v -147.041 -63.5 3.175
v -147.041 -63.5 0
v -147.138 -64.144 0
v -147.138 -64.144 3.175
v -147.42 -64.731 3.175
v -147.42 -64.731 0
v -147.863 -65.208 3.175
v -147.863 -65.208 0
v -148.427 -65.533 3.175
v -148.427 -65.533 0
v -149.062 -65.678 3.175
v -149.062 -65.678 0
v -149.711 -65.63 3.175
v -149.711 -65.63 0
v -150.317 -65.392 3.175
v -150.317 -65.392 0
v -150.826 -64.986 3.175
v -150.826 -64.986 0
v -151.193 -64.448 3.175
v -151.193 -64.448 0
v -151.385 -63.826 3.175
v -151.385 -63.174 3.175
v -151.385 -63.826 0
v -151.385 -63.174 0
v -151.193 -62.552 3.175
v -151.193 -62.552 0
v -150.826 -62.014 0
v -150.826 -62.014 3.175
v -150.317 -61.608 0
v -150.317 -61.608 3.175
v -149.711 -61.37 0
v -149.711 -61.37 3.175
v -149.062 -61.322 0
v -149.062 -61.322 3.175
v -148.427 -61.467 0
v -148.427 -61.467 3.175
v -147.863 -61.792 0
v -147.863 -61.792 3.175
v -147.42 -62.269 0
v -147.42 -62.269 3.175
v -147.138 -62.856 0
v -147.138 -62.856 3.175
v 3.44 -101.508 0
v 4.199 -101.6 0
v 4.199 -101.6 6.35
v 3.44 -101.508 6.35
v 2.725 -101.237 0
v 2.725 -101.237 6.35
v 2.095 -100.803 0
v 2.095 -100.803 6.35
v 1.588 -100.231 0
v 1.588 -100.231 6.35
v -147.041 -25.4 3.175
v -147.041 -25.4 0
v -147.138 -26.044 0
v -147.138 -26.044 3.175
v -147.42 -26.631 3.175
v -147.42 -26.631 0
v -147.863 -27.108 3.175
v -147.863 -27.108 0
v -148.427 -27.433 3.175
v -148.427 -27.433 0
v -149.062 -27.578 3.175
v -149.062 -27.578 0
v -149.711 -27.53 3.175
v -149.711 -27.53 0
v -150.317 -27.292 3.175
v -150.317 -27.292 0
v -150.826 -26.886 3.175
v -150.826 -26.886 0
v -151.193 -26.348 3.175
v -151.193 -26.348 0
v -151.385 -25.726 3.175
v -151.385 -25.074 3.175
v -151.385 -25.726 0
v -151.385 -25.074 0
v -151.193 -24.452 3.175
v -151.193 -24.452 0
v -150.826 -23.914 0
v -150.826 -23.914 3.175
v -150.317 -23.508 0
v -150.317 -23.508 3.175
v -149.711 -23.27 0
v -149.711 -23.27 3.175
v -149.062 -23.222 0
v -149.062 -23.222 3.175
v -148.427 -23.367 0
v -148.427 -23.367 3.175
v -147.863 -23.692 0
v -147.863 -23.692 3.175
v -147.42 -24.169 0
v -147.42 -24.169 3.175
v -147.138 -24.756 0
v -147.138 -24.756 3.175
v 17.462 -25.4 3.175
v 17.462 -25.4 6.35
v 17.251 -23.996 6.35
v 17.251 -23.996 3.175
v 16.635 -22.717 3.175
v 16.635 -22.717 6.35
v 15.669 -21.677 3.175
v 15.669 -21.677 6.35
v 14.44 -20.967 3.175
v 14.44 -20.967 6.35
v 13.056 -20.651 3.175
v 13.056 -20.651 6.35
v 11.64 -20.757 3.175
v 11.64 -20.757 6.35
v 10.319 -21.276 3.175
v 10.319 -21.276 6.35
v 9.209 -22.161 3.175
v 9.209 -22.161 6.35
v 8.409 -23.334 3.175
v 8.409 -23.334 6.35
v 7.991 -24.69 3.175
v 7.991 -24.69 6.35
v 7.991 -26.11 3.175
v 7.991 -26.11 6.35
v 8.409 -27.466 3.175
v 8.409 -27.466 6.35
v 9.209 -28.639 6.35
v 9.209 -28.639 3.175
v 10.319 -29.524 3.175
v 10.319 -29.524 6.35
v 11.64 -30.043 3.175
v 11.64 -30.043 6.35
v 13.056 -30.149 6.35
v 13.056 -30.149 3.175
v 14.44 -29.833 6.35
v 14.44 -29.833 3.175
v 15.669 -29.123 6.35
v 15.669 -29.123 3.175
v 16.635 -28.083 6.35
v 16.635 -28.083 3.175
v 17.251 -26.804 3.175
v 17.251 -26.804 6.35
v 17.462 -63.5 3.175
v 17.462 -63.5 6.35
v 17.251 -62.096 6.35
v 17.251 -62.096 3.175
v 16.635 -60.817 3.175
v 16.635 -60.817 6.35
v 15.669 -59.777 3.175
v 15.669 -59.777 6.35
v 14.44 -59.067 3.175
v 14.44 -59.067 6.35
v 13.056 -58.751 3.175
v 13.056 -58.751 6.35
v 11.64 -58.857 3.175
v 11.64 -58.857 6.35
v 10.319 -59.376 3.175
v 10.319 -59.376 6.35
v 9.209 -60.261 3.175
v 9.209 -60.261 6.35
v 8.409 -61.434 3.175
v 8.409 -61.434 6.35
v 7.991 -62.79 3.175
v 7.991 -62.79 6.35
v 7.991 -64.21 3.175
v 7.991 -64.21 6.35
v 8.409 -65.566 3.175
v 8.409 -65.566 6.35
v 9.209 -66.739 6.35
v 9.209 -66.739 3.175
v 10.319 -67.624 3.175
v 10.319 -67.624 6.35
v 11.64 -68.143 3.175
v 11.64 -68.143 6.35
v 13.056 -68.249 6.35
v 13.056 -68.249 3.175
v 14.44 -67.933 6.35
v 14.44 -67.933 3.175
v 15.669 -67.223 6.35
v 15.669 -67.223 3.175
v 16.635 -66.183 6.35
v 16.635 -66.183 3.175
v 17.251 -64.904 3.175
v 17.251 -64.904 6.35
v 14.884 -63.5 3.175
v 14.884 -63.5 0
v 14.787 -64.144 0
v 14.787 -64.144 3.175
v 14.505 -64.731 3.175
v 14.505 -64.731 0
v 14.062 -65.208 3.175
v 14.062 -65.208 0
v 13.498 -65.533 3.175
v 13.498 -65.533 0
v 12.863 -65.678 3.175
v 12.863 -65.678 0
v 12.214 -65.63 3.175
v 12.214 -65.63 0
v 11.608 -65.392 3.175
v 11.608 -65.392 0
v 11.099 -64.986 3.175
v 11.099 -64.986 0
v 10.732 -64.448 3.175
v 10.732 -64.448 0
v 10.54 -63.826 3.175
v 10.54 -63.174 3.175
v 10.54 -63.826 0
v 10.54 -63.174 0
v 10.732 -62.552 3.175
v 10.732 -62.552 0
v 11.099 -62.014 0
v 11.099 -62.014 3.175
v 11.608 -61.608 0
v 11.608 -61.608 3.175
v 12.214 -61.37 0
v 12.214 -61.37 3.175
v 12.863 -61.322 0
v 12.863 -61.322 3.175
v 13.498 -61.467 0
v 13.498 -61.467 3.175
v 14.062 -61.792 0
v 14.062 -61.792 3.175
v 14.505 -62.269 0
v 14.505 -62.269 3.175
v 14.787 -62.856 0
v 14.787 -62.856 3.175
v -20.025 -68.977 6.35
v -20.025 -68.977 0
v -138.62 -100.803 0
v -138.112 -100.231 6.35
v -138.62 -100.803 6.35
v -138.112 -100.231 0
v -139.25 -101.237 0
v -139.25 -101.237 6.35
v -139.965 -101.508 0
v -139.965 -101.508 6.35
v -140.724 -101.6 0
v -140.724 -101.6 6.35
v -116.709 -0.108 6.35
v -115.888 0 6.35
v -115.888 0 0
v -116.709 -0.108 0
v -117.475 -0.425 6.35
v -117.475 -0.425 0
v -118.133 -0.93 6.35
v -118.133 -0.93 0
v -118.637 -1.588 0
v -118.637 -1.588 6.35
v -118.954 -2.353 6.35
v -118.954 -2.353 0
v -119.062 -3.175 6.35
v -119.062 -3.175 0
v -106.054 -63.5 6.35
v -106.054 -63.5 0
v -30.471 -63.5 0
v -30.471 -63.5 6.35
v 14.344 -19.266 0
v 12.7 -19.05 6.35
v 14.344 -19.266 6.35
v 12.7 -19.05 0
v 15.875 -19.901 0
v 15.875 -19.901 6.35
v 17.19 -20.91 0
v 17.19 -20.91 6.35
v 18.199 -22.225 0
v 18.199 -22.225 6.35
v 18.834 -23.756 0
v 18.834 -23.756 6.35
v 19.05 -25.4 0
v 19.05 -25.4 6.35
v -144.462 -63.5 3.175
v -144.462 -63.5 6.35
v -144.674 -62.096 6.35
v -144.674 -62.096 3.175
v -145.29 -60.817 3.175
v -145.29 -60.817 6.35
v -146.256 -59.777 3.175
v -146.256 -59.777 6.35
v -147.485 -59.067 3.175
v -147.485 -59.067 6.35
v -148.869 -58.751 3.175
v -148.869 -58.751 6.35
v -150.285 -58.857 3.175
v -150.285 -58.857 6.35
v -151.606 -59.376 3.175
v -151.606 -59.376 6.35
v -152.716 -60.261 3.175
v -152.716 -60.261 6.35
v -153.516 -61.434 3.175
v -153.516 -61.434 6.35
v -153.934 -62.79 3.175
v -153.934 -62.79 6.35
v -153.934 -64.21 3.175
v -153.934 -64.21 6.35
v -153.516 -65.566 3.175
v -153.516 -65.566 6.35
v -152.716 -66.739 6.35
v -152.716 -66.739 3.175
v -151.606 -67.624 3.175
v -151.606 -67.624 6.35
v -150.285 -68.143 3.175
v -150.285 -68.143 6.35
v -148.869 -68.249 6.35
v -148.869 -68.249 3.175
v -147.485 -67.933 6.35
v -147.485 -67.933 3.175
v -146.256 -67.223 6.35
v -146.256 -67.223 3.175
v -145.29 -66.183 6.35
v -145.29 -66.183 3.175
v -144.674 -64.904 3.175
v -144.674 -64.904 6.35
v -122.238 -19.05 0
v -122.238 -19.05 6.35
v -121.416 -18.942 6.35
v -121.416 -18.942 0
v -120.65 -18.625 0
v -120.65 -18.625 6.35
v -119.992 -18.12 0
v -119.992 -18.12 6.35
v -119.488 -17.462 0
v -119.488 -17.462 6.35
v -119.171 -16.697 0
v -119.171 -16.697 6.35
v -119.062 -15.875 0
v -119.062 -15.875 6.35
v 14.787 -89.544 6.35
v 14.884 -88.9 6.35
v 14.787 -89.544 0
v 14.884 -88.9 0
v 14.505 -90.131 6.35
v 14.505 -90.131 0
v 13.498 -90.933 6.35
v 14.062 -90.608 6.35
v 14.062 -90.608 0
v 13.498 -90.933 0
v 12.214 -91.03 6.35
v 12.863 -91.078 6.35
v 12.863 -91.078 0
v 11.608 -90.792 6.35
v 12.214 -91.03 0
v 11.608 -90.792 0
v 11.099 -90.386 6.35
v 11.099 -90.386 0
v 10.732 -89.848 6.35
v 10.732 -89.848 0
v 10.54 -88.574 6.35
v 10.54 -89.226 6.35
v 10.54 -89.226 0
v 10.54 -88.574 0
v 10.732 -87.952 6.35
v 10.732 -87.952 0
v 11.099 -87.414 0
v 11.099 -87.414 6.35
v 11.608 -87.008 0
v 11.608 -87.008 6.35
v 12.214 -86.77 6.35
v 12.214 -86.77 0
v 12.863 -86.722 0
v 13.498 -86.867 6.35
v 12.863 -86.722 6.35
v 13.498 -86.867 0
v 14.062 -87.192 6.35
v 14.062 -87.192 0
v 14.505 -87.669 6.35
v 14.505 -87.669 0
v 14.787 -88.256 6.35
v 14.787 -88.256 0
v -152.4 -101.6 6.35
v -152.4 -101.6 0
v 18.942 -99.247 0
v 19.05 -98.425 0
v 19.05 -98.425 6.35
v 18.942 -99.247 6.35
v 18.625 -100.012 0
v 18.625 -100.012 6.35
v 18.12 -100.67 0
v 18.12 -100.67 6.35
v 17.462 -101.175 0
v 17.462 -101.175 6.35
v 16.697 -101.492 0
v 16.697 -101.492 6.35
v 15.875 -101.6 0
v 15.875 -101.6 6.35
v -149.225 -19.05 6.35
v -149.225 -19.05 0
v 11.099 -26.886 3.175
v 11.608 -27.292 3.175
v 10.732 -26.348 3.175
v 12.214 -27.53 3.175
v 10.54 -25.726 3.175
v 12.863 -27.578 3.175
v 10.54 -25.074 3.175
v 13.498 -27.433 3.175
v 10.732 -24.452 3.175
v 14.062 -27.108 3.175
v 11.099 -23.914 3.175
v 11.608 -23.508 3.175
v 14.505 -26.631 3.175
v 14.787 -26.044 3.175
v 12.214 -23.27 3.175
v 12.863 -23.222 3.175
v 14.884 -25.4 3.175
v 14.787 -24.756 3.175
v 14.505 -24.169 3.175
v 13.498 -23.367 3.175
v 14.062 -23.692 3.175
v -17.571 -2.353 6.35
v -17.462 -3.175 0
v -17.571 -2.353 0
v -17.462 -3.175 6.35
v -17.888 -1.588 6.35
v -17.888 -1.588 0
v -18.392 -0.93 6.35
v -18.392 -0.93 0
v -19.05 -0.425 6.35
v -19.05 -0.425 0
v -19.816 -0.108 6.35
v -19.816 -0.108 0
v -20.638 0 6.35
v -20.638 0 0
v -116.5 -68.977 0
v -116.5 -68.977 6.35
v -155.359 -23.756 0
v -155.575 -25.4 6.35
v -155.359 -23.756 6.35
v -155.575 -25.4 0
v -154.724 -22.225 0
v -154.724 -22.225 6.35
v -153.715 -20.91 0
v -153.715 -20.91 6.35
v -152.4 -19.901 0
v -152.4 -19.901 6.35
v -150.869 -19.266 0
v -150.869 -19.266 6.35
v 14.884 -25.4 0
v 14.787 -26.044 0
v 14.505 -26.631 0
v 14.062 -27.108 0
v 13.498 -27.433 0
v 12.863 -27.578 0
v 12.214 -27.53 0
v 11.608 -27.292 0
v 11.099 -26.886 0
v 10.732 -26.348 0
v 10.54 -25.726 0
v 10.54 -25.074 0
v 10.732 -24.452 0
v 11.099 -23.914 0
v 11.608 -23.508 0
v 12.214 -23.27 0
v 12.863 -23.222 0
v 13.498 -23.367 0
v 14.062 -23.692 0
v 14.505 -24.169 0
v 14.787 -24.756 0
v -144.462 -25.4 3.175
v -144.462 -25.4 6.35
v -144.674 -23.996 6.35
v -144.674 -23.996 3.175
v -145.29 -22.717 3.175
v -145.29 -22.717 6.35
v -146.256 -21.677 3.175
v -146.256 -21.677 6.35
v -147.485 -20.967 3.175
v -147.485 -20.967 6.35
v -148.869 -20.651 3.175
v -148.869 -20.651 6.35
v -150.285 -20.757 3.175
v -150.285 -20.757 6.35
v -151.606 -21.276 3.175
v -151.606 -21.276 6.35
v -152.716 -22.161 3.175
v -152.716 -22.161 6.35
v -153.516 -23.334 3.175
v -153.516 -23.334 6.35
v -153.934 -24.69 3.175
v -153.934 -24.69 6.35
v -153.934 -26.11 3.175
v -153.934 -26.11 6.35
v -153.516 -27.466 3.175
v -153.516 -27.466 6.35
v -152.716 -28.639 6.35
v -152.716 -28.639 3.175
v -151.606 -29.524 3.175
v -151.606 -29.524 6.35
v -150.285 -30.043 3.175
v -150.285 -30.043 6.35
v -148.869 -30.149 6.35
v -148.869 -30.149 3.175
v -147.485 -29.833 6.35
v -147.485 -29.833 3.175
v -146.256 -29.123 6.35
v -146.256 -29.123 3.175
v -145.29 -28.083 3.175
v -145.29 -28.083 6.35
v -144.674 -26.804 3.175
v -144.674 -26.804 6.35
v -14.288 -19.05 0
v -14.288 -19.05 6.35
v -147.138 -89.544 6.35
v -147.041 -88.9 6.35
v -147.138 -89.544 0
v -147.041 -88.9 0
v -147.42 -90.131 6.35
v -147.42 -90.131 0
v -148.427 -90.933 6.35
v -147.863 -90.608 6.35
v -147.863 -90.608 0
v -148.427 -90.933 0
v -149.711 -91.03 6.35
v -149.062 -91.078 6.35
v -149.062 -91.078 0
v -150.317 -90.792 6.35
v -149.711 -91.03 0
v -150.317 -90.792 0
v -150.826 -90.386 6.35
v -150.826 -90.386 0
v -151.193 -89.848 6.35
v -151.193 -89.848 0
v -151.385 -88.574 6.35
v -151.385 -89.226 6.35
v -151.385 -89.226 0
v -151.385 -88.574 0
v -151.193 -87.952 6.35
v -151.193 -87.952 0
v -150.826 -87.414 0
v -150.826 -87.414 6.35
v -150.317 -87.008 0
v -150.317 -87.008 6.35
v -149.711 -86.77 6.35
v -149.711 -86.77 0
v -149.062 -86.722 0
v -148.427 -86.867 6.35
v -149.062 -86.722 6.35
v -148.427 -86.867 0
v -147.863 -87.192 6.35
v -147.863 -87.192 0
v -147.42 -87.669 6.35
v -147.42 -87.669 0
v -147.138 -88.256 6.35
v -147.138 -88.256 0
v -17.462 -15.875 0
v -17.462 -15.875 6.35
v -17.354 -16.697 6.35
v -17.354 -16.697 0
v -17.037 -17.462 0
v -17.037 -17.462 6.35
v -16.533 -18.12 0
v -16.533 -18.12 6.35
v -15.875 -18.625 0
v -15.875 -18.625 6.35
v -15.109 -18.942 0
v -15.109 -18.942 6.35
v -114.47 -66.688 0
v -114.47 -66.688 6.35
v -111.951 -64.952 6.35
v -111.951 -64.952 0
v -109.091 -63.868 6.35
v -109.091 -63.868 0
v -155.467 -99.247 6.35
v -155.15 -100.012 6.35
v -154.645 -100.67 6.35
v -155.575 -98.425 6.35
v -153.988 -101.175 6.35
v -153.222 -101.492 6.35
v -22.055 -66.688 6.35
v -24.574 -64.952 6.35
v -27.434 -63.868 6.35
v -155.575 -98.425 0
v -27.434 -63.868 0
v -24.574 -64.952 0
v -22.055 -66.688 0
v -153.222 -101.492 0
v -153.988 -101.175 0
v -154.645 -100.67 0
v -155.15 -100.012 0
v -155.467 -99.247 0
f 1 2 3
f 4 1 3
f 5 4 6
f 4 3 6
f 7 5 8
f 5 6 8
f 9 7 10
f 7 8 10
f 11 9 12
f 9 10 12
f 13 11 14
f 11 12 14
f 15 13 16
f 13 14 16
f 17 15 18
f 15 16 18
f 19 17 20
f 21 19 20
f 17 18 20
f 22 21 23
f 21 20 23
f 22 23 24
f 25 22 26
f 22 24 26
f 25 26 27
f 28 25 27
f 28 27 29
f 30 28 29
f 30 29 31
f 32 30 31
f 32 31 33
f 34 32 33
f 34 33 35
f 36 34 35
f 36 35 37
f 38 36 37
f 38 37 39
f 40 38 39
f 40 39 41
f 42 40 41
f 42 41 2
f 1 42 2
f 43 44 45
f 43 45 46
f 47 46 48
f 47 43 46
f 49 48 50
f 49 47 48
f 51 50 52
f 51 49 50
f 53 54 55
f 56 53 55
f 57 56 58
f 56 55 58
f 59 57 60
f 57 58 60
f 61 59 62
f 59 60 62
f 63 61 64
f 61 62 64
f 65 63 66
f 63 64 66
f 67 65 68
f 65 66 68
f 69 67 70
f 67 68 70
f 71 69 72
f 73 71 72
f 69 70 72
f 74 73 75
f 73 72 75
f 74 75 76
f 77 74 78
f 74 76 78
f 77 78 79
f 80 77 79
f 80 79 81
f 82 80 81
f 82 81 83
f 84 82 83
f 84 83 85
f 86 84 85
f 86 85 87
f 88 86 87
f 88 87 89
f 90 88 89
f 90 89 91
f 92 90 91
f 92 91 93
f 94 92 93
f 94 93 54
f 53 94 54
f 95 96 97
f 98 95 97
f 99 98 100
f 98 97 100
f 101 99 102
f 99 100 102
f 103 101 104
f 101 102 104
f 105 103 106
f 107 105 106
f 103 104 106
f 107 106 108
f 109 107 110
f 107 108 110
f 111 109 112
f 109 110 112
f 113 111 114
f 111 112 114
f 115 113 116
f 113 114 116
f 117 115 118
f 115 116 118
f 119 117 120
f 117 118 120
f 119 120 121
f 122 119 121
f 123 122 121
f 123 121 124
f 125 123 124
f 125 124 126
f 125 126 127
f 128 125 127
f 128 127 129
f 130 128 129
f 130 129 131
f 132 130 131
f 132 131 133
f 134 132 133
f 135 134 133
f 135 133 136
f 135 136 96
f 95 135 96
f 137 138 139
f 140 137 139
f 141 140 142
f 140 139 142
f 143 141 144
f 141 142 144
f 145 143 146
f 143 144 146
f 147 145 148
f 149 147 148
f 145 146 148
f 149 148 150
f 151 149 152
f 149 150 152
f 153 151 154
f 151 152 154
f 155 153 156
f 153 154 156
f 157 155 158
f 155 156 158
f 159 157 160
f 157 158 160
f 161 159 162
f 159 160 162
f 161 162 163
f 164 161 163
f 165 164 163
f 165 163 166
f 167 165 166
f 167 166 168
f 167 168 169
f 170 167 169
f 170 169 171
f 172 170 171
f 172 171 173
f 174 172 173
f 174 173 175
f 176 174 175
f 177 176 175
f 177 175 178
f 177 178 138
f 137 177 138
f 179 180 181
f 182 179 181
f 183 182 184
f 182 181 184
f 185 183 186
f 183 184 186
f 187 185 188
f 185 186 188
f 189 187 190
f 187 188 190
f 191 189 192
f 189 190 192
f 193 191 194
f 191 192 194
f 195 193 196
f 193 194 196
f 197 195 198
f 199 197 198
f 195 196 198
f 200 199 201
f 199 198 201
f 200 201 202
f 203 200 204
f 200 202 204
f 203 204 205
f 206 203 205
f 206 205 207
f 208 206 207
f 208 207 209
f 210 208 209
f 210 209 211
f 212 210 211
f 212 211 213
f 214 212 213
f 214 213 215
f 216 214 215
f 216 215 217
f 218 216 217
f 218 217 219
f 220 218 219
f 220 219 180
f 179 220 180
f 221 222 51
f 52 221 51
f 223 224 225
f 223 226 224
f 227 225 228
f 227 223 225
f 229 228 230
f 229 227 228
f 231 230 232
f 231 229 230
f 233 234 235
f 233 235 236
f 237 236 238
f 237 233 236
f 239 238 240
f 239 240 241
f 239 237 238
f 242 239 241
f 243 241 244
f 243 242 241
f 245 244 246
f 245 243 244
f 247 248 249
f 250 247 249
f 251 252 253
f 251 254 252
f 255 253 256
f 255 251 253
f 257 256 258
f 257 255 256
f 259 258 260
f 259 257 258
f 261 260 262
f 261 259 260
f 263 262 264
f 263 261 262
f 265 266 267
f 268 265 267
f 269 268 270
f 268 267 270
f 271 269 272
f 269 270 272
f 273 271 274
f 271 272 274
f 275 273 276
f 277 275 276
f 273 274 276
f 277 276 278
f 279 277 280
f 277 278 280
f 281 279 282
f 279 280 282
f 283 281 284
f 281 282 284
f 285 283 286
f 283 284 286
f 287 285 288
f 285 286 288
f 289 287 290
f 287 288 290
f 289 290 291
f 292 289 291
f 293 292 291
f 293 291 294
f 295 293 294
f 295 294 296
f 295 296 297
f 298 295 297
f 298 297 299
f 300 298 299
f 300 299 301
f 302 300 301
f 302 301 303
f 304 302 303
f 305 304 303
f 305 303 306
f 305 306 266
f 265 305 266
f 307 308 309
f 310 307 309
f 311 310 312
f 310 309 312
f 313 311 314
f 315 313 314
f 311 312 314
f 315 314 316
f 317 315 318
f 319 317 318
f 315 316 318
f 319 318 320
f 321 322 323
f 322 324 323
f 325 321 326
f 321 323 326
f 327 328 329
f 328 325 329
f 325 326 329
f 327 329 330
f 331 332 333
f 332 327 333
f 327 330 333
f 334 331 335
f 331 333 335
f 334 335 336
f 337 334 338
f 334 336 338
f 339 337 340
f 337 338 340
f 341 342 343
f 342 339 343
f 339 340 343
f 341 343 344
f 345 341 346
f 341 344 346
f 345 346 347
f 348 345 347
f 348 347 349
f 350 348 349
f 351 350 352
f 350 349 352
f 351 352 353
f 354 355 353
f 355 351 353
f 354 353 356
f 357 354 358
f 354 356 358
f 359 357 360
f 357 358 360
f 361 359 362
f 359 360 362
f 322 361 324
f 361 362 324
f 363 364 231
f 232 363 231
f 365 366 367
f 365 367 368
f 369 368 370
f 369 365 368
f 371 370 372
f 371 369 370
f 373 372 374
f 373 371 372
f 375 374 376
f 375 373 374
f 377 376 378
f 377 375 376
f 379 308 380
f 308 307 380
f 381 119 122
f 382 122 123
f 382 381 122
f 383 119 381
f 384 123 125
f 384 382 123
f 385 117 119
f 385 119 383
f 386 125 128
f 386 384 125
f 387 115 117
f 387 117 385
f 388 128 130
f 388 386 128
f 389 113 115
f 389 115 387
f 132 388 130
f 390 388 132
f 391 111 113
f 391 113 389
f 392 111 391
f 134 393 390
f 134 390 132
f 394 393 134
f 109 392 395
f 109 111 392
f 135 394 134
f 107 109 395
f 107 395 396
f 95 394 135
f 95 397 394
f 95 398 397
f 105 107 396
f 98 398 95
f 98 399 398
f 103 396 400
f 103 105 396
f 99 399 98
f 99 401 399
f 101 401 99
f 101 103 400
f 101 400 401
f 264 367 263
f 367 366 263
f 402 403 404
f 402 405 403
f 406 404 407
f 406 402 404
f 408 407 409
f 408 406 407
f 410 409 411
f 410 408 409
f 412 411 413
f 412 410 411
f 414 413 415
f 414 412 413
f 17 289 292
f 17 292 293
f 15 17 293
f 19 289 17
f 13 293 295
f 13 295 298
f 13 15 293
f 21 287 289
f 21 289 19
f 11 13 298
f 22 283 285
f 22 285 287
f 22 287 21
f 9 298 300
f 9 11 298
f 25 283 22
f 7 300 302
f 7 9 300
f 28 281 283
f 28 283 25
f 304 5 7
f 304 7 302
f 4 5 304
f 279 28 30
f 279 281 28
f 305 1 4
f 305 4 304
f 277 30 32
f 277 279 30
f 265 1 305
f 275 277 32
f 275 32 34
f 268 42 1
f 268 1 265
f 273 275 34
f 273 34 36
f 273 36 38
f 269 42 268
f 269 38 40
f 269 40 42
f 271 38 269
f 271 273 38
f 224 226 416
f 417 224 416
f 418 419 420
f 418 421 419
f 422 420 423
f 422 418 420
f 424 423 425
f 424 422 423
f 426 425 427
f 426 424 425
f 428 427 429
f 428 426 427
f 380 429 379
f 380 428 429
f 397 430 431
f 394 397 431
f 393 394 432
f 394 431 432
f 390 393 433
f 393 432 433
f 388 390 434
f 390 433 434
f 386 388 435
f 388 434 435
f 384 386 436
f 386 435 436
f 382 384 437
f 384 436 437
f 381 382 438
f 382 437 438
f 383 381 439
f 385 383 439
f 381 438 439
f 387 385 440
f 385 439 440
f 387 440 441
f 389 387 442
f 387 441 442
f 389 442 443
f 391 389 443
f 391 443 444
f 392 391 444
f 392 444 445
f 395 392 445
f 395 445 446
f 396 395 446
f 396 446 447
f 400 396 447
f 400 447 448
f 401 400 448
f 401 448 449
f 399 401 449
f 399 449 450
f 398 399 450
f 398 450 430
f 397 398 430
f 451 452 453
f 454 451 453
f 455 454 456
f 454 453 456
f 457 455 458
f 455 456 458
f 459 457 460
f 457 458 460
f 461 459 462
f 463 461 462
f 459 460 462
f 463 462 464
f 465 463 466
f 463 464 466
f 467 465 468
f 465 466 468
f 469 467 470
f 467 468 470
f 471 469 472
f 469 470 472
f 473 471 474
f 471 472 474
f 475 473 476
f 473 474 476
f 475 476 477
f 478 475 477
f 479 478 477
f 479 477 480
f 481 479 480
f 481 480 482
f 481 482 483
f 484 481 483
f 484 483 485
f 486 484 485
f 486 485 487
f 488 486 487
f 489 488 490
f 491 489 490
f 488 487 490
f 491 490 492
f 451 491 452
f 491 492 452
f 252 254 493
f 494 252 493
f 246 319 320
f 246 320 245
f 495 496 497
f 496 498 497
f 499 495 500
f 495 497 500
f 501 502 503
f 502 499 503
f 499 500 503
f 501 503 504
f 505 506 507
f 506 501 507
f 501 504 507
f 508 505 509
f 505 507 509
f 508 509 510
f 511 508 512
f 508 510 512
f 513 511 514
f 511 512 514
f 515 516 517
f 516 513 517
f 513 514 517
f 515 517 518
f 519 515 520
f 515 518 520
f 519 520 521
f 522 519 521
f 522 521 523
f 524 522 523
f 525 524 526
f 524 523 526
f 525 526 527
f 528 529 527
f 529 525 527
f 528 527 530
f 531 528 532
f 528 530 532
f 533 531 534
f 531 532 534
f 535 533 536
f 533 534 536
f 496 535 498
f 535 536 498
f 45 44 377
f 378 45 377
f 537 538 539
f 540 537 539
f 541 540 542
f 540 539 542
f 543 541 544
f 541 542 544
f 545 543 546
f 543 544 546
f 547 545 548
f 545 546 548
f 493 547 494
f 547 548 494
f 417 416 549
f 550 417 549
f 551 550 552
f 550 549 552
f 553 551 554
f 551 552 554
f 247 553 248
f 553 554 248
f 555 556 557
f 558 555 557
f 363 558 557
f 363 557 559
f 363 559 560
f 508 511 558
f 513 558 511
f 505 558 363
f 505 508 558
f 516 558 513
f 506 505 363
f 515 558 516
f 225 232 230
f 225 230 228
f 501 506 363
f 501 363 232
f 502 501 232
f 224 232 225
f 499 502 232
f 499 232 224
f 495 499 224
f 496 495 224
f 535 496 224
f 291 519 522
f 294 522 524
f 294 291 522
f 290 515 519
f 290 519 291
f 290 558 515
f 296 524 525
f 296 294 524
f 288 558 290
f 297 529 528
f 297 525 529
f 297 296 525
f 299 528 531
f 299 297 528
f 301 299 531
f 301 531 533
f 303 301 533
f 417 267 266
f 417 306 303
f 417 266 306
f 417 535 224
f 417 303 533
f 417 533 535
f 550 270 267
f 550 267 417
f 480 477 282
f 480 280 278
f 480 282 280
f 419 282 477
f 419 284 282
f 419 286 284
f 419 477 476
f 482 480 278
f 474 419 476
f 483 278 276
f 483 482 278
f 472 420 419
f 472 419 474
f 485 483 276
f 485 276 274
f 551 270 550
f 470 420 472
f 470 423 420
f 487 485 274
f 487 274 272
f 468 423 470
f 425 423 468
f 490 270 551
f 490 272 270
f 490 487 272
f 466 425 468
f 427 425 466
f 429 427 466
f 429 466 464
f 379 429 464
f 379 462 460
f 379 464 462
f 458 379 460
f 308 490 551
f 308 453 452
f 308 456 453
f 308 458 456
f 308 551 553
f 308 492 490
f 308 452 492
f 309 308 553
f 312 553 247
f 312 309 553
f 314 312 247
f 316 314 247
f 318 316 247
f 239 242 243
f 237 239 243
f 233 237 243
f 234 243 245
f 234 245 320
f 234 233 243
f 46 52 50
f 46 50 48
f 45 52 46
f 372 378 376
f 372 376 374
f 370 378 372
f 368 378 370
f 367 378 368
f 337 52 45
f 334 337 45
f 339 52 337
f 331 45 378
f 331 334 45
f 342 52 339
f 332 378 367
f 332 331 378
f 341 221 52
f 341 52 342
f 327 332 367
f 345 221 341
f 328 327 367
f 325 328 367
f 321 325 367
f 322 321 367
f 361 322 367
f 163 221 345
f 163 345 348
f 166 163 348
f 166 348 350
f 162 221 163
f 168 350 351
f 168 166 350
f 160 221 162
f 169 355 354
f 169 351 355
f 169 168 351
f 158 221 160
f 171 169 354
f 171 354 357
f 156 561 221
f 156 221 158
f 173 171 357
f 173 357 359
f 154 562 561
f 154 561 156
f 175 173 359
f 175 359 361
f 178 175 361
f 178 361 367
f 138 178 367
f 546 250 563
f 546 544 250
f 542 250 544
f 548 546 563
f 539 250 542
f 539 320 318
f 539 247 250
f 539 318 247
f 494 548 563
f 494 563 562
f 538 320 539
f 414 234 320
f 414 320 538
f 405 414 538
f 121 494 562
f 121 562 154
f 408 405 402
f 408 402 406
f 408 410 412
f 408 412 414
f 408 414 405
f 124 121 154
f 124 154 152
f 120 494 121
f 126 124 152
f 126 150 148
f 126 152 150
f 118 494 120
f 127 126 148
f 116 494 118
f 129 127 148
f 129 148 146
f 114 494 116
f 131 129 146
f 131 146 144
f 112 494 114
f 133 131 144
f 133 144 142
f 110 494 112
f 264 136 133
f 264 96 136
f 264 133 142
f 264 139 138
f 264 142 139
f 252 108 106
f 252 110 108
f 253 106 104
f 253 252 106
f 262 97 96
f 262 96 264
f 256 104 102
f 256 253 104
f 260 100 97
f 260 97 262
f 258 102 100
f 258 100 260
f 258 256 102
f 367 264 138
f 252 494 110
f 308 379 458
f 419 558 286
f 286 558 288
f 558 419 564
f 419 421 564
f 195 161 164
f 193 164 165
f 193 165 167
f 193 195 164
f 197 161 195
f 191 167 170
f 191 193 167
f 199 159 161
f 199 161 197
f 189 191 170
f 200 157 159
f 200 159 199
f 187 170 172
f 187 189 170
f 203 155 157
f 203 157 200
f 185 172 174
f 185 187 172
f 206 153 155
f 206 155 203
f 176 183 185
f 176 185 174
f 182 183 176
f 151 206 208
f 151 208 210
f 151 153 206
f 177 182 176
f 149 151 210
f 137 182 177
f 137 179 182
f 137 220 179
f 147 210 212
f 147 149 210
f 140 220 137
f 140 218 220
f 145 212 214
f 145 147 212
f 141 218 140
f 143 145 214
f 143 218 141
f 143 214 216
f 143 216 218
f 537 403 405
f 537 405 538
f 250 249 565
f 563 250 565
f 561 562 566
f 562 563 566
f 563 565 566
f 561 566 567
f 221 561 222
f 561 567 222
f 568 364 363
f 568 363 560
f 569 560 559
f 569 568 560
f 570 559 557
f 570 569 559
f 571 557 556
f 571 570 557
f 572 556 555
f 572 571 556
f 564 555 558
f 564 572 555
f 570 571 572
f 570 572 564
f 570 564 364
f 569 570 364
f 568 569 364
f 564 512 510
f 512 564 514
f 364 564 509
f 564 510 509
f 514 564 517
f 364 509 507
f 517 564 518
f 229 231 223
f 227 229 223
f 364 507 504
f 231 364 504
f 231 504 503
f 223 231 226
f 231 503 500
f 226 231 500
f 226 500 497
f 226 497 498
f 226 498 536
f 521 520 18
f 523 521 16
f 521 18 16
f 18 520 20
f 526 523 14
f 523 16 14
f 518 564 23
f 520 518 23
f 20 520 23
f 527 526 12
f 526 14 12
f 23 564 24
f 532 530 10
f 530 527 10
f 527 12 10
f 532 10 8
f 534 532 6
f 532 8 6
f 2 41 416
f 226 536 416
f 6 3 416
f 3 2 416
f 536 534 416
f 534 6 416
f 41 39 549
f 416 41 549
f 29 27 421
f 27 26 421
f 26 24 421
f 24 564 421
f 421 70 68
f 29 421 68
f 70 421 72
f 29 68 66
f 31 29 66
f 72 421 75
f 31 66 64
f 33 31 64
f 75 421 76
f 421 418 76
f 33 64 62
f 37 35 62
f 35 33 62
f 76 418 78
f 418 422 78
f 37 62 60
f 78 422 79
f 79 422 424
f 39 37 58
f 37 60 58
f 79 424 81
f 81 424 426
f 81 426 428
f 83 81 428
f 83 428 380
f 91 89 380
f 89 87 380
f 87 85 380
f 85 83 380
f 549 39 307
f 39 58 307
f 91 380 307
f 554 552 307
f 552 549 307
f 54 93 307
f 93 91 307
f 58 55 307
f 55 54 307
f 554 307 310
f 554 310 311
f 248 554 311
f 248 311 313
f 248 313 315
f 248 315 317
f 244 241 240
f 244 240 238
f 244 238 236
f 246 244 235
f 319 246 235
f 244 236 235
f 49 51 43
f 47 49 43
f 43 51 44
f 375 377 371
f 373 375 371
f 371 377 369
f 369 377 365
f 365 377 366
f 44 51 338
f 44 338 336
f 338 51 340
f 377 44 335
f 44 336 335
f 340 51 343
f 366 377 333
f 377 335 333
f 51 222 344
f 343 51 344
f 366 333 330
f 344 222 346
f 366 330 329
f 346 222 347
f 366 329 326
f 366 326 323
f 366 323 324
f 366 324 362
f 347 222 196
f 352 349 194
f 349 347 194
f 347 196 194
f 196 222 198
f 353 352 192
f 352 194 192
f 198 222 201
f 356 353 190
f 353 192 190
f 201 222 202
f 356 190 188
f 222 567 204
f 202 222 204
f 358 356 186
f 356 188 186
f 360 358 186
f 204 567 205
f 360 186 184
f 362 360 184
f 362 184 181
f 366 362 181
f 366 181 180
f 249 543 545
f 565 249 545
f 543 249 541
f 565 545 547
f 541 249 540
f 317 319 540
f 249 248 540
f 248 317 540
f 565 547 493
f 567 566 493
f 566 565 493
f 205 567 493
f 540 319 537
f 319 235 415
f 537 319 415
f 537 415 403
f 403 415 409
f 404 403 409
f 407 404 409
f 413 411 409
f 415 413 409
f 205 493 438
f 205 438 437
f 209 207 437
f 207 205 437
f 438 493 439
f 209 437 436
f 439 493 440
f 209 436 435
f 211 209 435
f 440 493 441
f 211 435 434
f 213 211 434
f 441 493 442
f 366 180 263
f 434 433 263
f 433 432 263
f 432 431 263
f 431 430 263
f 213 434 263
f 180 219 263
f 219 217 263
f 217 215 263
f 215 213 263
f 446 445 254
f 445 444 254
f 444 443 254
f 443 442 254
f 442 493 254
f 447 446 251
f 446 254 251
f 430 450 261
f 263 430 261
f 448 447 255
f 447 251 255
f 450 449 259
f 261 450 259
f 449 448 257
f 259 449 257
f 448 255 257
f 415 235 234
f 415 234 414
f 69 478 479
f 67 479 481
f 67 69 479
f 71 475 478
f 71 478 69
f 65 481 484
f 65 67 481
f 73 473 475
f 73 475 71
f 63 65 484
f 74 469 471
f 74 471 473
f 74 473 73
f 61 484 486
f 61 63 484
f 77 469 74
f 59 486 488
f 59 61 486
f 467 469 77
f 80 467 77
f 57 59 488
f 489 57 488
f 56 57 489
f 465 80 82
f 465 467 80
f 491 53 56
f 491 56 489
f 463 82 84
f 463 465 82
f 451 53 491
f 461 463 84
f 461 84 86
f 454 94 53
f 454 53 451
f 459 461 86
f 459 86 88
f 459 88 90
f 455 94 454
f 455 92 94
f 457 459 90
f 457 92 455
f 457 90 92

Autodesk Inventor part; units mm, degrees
ref_plane "YZ Plane" through (0, 0, 0) normal (1, 0, 0) x (0, 1, 0)
ref_plane "XZ Plane" through (0, 0, 0) normal (0, 1, 0) x (-1, 0, 0)
ref_plane "XY Plane" through (0, 0, 0) normal (0, 0, 1) x (1, 0, 0)
sketch "Sketch1" plane through (0, 0, 0) normal (0, 0, 1) x (1, 0, 0)
  circle A0 centre (12.7, -88.9) radius 2.1844 projected
  circle A1 centre (-149.225, -88.9) radius 2.1844 projected
  circle A2 centre (12.7, -25.4) radius 2.1844 projected
  circle A3 centre (-149.225, -25.4) radius 2.1844 projected
  circle A4 centre (-149.225, -63.5) radius 2.1844 projected
  circle A5 centre (12.7, -63.5) radius 2.1844 projected
  line L0 (12.7, -19.05) -> (-149.225, -19.05)
  line L1 (-155.575, -25.4) -> (-155.575, -98.425)
  line L2 (-152.4, -101.6) -> (-140.7239, -101.6)
  line L3 (-138.1125, -100.2308) -> (-116.4997, -68.9766)
  line L4 (-106.054, -63.5) -> (-30.471, -63.5)
  line L5 (-20.0253, -68.9766) -> (1.5875, -100.2308)
  line L6 (4.1989, -101.6) -> (15.875, -101.6)
  line L7 (19.05, -98.425) -> (19.05, -25.4)
  arc A6 (19.05, -25.4) -> (12.7, -19.05) centre (12.7, -25.4) ccw
  arc A7 (-149.225, -19.05) -> (-155.575, -25.4) centre (-149.225, -25.4) ccw
  arc A8 (15.875, -101.6) -> (19.05, -98.425) centre (15.875, -98.425) ccw
  arc A9 (1.5875, -100.2308) -> (4.1989, -101.6) centre (4.1989, -98.425) ccw
  arc A10 (-140.7239, -101.6) -> (-138.1125, -100.2308) centre (-140.7239, -98.425) ccw
  arc A11 (-155.575, -98.425) -> (-152.4, -101.6) centre (-152.4, -98.425) ccw
  line L8 (-68.2625, -19.05) -> (-68.2625, -63.5) construction
  arc A12 (-20.0253, -68.9766) -> (-30.471, -63.5) centre (-30.471, -76.2) ccw
  arc A13 (-106.054, -63.5) -> (-116.4997, -68.9766) centre (-106.054, -76.2) ccw
  line L9 (-119.0625, -19.05) -> (-119.0625, 0)
  line L10 (-119.0625, 0) -> (-17.4625, 0)
  line L11 (-17.4625, 0) -> (-17.4625, -19.05)
  point P0 (0, 0)
  point P1 (-112.7125, -63.5)
  point P2 (-23.8125, -63.5)
  dimension "d0" = 6.35
  dimension "d2" = 3.175
  dimension "d3" = 12.7
  dimension "d4" = 88.9
  dimension "d5" = 44.45
  dimension "d6" = 25.4
  dimension "d7" = 12.7
  dimension "d23" = 101.6
  dimension "d24" = 19.05
extrude "Extrusion1" add sketch "Sketch1" along normal blind 6.35
fillet "Fillet2" radius 3.175 4 edges at (-119.0625, 0, 3.175) (-119.0625, -19.05, 3.175) (-17.4625, 0, 3.175) (-17.4625, -19.05, 3.175)
sketch "Sketch3" plane through (0, 0, 6.35) normal (0, 0, 1) x (1, 0, 0)
  circle A0 centre (12.7, -25.4) radius 2.1844 projected
  circle A1 centre (12.7, -25.4) radius 4.7625
  circle A2 centre (12.7, -63.5) radius 2.1844 projected
  circle A3 centre (12.7, -63.5) radius 4.7625
  circle A4 centre (-149.225, -25.4) radius 2.1844 projected
  circle A5 centre (-149.225, -25.4) radius 4.7625
  circle A6 centre (-149.225, -63.5) radius 2.1844 projected
  circle A7 centre (-149.225, -63.5) radius 4.7625
  point P0 (0, 0)
  dimension "d26" = 9.525
  dimension "d27" = 9.525
  dimension "d28" = 9.525
  dimension "d29" = 9.525
extrude "Extrusion3" cut sketch "Sketch3" against normal blind 3.175 contours A0 | A1 | A2 | A3 | A4 | A5 | A6 | A7
properties part number "backalignermidgoal" material "Acetal Resin, Black"
